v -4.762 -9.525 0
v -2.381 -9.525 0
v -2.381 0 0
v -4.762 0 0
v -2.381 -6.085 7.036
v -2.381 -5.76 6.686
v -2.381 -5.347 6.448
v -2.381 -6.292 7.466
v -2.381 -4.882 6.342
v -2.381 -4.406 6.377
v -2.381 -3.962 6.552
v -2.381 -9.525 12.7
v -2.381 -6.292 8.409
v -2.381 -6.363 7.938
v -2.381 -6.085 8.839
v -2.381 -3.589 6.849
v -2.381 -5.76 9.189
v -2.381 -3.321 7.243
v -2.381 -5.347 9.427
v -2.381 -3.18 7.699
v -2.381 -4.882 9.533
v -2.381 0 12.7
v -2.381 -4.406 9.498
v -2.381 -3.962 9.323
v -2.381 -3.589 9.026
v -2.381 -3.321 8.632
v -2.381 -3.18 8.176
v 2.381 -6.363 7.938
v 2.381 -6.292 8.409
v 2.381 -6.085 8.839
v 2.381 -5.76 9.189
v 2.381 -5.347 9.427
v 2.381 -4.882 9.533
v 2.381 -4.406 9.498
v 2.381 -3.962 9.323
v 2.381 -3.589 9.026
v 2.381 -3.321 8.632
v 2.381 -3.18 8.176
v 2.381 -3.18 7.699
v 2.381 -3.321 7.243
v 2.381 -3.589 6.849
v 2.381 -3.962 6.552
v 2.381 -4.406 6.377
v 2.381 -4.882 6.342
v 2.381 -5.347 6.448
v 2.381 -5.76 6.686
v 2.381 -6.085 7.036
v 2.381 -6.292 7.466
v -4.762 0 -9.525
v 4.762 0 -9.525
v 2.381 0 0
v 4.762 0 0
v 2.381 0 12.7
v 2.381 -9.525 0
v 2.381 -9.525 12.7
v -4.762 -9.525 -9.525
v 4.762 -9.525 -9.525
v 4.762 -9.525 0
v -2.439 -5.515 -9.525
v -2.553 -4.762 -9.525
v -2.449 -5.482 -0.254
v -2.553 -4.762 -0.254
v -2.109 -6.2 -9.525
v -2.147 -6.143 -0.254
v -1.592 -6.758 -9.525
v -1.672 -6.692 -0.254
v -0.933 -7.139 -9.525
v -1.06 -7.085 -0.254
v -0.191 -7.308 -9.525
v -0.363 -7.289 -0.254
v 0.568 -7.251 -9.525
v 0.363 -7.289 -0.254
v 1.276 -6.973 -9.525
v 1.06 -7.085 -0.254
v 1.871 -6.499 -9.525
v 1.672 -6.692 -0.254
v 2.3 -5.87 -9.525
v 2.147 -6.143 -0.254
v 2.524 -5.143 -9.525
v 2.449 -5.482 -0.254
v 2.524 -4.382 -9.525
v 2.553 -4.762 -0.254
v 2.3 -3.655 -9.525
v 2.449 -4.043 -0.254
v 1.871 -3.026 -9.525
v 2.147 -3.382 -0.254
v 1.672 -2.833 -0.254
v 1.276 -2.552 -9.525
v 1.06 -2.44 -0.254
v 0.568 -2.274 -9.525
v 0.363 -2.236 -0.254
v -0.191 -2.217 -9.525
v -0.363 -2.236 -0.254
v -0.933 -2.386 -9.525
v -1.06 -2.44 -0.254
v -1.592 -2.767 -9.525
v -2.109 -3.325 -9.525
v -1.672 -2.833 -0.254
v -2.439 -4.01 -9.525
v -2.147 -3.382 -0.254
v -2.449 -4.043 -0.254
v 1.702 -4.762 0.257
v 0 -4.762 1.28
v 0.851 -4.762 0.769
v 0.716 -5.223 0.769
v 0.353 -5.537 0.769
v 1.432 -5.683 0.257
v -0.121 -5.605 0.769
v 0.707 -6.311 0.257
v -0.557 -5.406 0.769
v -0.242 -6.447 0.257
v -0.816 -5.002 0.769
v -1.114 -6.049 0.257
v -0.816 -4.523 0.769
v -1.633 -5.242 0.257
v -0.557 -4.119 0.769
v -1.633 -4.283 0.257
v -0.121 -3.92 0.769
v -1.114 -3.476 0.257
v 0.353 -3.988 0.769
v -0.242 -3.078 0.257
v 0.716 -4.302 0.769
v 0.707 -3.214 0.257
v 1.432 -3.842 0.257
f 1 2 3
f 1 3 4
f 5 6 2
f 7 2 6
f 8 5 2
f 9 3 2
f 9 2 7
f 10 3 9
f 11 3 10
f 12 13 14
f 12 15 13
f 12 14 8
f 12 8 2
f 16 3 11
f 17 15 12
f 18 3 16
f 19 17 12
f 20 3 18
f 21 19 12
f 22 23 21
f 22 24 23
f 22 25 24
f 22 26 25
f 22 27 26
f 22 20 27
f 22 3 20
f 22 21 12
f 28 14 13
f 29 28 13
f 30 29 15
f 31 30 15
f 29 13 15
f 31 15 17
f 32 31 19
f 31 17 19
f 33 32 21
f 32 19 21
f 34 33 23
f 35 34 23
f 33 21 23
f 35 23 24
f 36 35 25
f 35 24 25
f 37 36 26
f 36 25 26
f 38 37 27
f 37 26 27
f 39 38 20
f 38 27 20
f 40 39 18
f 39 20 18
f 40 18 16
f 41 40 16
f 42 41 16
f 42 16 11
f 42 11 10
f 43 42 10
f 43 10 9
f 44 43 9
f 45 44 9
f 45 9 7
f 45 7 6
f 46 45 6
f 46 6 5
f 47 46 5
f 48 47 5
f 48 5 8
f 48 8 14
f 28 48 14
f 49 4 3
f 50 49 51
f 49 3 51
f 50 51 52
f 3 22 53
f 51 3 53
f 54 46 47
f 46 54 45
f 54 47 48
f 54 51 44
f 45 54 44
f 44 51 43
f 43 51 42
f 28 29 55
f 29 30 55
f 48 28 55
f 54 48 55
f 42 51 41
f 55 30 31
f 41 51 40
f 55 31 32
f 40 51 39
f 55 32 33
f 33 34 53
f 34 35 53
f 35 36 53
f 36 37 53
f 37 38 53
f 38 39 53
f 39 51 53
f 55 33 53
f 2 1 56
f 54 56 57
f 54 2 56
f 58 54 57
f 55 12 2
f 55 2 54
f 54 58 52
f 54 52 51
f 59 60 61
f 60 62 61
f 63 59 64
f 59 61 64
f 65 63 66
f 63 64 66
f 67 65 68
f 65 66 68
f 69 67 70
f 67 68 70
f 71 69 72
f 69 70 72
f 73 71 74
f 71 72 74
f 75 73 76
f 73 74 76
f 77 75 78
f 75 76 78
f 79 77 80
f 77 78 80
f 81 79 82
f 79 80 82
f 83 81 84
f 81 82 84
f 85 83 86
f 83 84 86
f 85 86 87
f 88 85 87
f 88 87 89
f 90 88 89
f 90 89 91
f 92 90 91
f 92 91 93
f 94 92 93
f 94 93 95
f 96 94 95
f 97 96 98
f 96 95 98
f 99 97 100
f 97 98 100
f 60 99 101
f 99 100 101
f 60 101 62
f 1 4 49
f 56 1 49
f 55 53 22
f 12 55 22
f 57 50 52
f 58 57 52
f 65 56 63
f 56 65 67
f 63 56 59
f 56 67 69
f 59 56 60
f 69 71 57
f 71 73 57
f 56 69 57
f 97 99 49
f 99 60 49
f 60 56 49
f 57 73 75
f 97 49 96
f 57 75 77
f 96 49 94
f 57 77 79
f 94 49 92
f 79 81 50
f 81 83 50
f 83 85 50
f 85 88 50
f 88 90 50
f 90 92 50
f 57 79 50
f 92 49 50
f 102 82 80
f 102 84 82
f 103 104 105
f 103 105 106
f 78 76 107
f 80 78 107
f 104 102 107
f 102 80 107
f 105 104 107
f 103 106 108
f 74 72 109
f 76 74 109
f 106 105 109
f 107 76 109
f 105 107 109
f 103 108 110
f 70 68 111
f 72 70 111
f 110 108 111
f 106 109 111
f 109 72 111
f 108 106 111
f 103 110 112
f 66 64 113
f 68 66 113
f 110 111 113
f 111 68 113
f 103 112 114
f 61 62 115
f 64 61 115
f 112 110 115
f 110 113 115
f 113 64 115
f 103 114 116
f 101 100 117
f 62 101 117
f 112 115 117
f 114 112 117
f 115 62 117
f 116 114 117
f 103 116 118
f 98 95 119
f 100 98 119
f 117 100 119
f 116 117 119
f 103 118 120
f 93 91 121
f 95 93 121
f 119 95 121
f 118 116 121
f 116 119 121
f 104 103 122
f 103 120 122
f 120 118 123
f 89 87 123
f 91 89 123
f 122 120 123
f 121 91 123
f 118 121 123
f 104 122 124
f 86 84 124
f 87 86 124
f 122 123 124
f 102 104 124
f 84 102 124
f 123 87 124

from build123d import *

# Parameters (mm, degrees)
F0_W     = 2.38125
F0_H     = 12.7
F1_DEPTH = 9.525
F3_D     = 3.2004
F5_D     = 5.1054
F5_DEPTH = 9.271
F5_TIP   = 1.5338169022


with BuildPart() as f1:
    # F0 (on Front) → F1 (new body)
    with BuildSketch(Plane.XZ):
        Polygon((0, -9.525), (0, 0), (-2.38125, 0), (-4.7625, 0), (-4.7625, -9.525), align=None)
        Polygon((2.38125, 0), (0, 0), (0, -9.525), (4.7625, -9.525), (4.7625, 0), align=None)
        with Locations((1.190625, 6.35)):
            Rectangle(F0_W, F0_H)
        with Locations((-1.190625, 6.35)):
            Rectangle(F0_W, F0_H)
    extrude(amount=F1_DEPTH)

    # F3 (through all)
    with Locations(Plane.YZ.offset(2.38125)):
        with Locations((-4.7625, 7.9375)):
            Hole(F3_D / 2)

    # F5
    with Locations(Plane(origin=(0, 0, -9.525), x_dir=(1, 0, 0), z_dir=(0, 0, -1))):
        with Locations((0, 4.7625)):
            Hole(F5_D / 2, depth=F5_DEPTH)
            with Locations((0, 0, -(F5_DEPTH + F5_TIP / 2))):  # 118° drill point
                Cone(0, F5_D / 2, F5_TIP, mode=Mode.SUBTRACT)


solid = f1.part
